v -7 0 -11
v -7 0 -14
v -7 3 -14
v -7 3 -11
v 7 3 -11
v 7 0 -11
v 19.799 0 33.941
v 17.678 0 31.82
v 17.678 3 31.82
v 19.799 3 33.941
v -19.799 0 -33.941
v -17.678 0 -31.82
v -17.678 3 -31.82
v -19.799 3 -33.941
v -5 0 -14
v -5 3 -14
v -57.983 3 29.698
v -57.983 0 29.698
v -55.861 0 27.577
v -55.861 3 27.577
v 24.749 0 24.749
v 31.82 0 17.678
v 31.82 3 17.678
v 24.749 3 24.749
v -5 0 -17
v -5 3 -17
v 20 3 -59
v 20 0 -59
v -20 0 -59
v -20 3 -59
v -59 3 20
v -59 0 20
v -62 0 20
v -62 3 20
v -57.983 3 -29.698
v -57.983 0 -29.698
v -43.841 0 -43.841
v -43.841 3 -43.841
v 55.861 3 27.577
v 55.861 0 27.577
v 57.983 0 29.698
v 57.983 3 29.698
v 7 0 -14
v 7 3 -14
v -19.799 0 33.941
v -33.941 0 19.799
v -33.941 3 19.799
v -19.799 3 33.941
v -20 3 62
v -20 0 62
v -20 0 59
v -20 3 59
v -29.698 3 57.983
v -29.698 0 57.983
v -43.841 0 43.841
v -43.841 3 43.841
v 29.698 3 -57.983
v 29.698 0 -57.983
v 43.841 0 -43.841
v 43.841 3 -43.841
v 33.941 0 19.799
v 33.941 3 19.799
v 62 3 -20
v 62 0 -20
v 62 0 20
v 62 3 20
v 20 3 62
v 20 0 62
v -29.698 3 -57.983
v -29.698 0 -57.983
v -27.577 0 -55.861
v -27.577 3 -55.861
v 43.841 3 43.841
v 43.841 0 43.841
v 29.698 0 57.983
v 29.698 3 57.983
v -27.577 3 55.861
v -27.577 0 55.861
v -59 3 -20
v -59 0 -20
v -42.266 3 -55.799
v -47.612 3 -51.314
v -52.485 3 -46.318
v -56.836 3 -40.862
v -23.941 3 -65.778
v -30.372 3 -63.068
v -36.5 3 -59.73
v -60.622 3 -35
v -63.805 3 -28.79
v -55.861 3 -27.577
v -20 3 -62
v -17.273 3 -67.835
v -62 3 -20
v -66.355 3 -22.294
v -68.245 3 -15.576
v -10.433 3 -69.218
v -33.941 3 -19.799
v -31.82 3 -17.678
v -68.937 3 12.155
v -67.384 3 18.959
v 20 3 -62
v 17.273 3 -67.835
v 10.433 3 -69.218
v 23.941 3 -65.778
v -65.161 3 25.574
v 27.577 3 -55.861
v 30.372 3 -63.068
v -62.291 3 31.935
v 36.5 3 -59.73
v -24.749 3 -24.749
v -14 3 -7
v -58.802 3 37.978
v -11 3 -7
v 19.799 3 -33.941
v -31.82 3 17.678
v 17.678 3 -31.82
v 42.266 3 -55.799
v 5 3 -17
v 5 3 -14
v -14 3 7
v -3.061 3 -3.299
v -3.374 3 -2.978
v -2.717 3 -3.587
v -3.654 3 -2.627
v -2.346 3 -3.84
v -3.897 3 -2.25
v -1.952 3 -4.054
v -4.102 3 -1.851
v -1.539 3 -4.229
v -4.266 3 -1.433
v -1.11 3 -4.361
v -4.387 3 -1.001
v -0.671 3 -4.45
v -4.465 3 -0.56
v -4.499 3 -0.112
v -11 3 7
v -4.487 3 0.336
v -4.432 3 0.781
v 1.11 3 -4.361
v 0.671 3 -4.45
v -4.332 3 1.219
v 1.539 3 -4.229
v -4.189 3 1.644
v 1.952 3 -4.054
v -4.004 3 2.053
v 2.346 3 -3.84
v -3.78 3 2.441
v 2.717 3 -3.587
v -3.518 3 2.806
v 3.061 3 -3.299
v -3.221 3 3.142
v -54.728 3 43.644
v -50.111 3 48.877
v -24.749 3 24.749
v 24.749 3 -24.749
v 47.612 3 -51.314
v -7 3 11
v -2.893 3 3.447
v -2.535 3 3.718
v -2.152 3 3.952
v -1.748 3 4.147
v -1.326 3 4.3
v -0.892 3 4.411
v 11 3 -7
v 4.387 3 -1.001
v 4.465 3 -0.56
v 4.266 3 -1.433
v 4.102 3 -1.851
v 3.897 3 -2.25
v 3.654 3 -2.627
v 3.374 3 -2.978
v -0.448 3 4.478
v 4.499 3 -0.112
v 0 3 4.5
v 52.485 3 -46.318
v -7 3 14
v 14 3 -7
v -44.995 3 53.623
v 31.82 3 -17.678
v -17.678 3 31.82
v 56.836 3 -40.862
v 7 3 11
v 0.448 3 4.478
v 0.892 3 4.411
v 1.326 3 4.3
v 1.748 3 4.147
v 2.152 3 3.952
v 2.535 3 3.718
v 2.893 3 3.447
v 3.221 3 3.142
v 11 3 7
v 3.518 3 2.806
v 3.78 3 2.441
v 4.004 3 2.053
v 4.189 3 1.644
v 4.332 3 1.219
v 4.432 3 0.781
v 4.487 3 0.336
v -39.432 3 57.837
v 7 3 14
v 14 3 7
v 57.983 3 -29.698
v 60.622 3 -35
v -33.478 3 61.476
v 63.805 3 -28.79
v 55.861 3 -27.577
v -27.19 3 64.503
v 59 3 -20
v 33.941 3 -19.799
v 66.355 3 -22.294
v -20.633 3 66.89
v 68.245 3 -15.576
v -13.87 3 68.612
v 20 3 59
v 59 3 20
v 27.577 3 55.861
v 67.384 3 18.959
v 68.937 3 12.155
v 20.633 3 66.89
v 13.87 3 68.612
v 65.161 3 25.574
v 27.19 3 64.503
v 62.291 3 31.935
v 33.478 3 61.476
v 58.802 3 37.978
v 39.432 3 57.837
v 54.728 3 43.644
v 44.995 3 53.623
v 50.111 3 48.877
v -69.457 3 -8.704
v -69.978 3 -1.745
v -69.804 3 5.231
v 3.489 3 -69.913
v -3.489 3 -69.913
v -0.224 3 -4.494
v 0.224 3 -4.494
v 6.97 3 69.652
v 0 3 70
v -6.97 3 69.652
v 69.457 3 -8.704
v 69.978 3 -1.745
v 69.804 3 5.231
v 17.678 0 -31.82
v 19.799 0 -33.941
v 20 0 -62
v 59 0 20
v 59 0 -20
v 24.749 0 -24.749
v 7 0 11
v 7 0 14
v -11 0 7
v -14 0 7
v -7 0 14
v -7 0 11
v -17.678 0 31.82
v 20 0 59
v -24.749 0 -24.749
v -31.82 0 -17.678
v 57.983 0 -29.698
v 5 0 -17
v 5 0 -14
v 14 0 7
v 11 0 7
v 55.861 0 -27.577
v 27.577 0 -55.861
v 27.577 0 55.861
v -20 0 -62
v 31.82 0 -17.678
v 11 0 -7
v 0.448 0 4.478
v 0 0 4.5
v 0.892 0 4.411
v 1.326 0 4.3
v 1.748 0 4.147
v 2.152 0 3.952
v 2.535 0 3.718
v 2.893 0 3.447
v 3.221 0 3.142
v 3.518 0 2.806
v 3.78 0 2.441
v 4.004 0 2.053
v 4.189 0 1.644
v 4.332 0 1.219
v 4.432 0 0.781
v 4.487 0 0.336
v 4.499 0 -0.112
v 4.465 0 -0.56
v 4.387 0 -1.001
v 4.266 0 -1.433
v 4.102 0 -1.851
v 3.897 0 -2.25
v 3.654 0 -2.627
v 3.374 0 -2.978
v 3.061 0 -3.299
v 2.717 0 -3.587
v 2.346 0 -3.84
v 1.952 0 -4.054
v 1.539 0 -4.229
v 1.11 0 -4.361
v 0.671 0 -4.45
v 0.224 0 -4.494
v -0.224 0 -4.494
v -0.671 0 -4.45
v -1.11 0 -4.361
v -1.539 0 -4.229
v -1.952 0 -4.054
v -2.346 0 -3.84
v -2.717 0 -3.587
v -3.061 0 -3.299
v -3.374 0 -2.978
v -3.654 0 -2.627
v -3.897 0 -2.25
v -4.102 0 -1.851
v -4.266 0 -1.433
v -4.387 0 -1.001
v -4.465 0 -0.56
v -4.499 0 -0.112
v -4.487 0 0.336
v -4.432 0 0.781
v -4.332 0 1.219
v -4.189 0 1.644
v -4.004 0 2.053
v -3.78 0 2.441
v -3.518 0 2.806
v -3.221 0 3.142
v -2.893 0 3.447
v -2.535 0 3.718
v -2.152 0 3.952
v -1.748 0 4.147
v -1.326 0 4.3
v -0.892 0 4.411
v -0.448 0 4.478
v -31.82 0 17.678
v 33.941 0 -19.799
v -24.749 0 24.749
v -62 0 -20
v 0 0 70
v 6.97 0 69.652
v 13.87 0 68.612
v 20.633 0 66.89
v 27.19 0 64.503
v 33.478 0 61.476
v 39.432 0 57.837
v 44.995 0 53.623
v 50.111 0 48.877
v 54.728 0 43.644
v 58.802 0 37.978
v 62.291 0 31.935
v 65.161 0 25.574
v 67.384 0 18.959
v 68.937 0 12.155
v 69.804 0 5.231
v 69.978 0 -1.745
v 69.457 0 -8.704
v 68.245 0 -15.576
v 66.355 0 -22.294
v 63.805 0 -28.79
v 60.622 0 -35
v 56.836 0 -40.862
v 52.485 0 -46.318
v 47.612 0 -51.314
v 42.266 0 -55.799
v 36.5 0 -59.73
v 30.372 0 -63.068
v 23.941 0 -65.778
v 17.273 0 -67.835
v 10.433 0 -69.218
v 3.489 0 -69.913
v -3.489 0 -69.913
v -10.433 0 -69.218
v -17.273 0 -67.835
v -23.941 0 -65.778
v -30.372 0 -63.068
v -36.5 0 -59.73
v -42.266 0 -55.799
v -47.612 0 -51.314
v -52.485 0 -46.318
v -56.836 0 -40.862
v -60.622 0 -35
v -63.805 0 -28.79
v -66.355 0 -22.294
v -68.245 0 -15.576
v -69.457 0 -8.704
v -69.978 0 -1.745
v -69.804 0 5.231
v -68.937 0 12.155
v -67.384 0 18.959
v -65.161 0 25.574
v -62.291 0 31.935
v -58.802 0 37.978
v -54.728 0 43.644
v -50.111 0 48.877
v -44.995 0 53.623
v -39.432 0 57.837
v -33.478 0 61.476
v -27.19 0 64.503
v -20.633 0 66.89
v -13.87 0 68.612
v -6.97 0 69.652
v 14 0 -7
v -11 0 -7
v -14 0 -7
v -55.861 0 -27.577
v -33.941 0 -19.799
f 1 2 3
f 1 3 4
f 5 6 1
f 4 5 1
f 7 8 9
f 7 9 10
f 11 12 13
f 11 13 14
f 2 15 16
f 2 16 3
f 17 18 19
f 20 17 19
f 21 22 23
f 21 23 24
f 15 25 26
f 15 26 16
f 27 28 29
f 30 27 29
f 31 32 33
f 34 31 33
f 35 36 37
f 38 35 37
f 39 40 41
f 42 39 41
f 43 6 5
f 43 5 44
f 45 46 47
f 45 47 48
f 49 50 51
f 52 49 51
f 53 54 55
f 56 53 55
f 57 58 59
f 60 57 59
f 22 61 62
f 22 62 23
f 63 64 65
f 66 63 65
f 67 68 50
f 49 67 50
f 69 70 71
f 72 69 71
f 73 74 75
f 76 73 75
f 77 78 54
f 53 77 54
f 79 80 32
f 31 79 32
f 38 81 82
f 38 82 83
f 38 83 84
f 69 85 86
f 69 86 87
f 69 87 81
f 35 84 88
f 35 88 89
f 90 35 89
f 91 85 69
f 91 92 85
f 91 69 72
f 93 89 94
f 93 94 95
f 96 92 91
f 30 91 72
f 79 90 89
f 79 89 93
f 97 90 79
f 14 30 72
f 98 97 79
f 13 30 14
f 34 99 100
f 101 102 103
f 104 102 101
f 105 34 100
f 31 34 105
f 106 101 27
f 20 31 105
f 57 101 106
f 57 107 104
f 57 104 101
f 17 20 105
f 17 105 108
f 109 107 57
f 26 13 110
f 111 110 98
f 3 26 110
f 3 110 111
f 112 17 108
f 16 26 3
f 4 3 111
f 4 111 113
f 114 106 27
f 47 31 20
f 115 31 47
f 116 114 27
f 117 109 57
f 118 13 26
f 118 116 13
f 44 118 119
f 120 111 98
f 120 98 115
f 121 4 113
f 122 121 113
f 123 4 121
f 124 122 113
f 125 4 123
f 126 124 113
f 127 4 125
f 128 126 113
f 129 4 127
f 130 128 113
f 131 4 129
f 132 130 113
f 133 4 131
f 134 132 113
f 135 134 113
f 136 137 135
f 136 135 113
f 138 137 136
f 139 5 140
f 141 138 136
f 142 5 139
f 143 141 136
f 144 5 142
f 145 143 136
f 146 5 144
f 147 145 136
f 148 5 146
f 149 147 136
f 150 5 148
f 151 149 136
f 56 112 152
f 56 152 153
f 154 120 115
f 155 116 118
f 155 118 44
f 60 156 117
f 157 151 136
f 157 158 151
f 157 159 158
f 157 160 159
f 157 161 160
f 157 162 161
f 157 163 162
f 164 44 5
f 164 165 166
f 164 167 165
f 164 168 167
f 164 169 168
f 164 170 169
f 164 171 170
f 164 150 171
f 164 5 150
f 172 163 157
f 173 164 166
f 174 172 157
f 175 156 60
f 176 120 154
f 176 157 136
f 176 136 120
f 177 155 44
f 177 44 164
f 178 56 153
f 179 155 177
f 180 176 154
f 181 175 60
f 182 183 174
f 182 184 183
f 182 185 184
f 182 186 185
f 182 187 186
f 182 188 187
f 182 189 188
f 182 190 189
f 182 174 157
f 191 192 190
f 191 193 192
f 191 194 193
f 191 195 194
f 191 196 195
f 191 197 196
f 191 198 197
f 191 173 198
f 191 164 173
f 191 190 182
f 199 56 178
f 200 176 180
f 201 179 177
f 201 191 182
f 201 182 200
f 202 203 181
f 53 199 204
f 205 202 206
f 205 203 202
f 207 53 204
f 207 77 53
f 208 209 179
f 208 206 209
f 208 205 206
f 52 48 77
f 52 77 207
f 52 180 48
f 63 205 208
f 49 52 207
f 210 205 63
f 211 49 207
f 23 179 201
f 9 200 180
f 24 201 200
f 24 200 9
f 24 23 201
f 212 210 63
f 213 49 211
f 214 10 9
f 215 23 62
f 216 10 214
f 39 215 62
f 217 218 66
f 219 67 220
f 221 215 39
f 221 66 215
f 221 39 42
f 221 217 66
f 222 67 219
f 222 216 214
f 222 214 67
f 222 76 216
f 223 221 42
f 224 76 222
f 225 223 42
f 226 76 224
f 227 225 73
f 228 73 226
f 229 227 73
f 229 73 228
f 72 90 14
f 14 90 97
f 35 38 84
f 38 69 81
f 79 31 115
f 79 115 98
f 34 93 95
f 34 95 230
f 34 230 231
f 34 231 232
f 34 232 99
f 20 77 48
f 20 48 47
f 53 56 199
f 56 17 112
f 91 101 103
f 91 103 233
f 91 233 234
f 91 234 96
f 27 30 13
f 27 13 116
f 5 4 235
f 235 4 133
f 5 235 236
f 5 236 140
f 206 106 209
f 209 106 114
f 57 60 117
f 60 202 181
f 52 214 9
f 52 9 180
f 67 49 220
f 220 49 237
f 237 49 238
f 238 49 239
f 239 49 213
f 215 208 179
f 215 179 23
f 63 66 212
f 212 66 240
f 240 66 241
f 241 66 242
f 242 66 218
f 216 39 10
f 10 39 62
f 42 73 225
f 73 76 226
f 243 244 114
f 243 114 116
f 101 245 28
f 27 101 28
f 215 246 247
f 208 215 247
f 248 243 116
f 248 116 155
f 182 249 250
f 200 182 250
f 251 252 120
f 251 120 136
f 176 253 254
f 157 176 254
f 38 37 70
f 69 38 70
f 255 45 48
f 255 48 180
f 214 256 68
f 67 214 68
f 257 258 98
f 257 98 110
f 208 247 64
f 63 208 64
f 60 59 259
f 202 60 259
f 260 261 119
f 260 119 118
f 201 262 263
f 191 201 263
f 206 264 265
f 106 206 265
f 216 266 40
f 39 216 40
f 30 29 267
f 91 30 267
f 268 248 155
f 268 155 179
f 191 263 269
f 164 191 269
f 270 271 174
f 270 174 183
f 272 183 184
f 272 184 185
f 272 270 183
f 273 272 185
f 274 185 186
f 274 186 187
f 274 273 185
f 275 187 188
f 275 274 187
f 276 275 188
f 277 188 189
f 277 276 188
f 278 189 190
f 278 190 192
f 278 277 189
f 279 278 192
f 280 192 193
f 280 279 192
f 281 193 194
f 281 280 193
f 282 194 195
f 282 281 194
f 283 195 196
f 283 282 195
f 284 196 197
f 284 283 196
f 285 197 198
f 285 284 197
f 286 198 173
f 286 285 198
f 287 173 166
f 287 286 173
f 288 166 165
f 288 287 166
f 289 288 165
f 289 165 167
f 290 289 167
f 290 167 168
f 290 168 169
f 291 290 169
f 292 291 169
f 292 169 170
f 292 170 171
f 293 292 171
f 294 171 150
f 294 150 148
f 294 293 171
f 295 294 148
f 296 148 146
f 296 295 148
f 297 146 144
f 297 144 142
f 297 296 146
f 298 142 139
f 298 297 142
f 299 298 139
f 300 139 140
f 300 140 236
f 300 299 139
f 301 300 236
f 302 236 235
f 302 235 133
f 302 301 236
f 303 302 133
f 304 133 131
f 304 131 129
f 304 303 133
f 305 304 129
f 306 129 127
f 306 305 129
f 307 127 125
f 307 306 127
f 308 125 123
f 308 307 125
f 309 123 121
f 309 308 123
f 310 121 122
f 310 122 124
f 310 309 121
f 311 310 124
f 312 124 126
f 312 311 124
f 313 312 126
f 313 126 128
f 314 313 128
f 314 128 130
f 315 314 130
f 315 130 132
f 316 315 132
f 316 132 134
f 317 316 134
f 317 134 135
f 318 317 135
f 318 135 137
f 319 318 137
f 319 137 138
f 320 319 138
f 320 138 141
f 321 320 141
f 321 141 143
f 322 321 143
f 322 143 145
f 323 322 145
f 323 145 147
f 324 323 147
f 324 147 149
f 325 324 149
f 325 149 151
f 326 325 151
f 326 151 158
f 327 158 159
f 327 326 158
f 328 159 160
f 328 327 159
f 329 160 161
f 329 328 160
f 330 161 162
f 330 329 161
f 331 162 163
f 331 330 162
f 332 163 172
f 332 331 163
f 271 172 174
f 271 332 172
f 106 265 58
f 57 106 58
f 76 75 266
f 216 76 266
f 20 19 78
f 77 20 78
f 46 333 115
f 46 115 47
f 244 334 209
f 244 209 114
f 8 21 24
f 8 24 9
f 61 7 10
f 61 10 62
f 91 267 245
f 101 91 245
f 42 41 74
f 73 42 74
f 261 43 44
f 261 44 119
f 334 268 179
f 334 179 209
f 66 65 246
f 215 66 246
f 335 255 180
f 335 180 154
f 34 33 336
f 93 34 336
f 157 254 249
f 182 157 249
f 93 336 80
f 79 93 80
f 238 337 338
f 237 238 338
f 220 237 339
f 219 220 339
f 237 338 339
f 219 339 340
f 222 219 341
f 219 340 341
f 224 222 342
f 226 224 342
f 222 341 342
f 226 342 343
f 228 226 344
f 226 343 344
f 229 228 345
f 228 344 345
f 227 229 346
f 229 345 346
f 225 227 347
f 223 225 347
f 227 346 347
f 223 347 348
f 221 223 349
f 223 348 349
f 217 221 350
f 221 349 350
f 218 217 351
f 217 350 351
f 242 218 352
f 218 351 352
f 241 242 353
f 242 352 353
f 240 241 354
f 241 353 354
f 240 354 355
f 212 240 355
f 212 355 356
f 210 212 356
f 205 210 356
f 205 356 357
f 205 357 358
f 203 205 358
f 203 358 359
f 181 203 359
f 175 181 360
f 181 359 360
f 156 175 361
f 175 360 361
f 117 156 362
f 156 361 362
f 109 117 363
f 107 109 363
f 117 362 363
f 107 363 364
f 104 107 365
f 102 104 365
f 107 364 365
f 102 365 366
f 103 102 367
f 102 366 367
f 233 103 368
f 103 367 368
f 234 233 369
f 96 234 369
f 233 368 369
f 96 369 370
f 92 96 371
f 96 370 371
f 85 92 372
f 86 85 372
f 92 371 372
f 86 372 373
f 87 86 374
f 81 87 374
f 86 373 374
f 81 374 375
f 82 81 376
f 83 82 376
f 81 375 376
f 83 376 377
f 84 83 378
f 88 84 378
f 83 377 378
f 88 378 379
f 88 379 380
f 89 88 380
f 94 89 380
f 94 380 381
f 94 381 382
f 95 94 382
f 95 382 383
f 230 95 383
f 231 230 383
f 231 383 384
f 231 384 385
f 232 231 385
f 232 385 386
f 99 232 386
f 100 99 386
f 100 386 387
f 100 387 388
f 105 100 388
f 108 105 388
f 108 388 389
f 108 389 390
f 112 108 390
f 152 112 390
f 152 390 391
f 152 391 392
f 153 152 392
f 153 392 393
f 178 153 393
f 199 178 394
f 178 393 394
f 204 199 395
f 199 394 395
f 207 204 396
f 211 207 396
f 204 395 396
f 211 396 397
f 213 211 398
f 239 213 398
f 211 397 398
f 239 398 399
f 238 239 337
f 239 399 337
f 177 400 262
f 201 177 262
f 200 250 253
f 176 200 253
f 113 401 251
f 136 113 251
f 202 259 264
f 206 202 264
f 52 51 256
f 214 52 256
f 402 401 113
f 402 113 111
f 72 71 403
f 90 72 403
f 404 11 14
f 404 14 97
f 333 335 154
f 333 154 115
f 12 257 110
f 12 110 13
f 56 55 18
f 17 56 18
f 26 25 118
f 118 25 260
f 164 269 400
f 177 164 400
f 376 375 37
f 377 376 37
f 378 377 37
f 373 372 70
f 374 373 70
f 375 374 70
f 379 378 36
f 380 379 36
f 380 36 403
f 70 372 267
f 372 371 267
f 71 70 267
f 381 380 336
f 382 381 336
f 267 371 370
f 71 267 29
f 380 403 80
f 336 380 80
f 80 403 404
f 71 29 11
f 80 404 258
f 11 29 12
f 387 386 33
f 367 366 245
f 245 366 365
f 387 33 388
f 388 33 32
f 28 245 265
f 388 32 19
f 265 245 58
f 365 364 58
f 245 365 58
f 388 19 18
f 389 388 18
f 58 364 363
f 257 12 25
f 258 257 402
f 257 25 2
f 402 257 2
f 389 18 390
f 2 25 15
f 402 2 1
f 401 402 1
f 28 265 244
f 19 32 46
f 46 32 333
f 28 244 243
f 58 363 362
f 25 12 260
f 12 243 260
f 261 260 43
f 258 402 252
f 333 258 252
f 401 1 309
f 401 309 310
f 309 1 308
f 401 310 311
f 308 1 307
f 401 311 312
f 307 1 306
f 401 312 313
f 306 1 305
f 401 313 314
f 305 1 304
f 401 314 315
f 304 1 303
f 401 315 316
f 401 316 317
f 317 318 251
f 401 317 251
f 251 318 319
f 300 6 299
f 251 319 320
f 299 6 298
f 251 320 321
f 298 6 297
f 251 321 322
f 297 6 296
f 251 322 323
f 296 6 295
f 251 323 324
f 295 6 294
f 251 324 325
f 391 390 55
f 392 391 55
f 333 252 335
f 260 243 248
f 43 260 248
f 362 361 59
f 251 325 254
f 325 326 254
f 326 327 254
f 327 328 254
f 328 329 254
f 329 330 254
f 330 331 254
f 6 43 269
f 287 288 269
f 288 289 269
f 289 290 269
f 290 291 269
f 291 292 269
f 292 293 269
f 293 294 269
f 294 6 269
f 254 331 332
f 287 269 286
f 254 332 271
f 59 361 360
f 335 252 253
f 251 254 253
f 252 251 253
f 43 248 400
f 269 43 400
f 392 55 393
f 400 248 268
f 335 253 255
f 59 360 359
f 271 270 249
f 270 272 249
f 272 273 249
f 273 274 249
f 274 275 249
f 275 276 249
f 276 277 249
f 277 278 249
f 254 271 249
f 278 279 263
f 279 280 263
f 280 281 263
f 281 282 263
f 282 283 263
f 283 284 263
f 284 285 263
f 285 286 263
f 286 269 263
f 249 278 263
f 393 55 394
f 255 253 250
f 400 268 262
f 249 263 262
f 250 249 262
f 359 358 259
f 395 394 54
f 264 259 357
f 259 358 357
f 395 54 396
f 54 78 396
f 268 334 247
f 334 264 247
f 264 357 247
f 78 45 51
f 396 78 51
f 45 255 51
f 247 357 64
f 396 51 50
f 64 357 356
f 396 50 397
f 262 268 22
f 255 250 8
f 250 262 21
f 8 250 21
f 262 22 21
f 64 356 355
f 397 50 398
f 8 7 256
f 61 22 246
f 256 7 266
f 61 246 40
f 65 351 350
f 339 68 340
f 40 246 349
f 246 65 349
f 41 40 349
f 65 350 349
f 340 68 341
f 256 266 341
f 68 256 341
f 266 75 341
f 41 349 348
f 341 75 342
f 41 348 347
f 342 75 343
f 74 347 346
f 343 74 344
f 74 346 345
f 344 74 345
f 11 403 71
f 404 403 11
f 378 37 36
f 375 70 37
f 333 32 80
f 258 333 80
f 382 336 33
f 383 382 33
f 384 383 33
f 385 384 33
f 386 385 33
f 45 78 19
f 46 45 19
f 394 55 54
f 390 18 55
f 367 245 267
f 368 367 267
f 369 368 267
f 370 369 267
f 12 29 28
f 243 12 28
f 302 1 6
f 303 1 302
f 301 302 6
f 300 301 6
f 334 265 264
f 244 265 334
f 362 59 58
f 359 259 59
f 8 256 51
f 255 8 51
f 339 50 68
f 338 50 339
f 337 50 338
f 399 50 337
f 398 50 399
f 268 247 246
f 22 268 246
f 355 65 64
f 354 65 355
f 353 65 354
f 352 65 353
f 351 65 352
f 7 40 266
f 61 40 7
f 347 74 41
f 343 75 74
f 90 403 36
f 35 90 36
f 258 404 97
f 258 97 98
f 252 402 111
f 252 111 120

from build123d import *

# Parameters (mm, degrees)
CROQUIS1_R              = 70
CROQUIS1_R_2            = 4.5
SALIENTE_EXTRUIR1_DEPTH = 3


with BuildPart() as part:
    # Croquis1 → Saliente-Extruir1 (new body)
    with BuildSketch(Plane(origin=(0, 0, 0), x_dir=(1, 0, 0), z_dir=(0, 1, 0))):
        with Locations(Location((0, 0, 0), (0, 0, 270))):
            Circle(CROQUIS1_R)
        with Locations(Location((0, 0, 0), (0, 0, 270))):
            Circle(CROQUIS1_R_2, mode=Mode.SUBTRACT)
        Polygon((0, 11), (7, 11), (7, 14), (5, 14), (5, 17), (0, 17), (-5, 17), (-5, 14), (-7, 14), (-7, 11), align=None, mode=Mode.SUBTRACT)
        Polygon((24.748737342, 24.748737342), (31.819805153, 17.67766953), (33.941125497, 19.798989873), (19.798989873, 33.941125497), (17.67766953, 31.819805153), align=None, mode=Mode.SUBTRACT)
        Polygon((11, 0), (11, 7), (14, 7), (14, -7), (11, -7), align=None, mode=Mode.SUBTRACT)
        Polygon((-24.748737342, 24.748737342), (-17.67766953, 31.819805153), (-19.798989873, 33.941125497), (-33.941125497, 19.798989873), (-31.819805153, 17.67766953), align=None, mode=Mode.SUBTRACT)
        Polygon((-14, -7), (-11, -7), (-11, 0), (-11, 7), (-14, 7), align=None, mode=Mode.SUBTRACT)
        Polygon((7, -11), (7, -14), (-7, -14), (-7, -11), (0, -11), align=None, mode=Mode.SUBTRACT)
        Polygon((24.748737342, -24.748737342), (17.67766953, -31.819805153), (19.798989873, -33.941125497), (33.941125497, -19.798989873), (31.819805153, -17.67766953), align=None, mode=Mode.SUBTRACT)
        Polygon((-24.748737342, -24.748737342), (-31.819805153, -17.67766953), (-33.941125497, -19.798989873), (-19.798989873, -33.941125497), (-17.67766953, -31.819805153), align=None, mode=Mode.SUBTRACT)
        Polygon((0, 62), (20, 62), (20, 59), (-20, 59), (-20, 62), align=None, mode=Mode.SUBTRACT)
        Polygon((55.861435714, 27.577164466), (27.577164466, 55.861435714), (29.69848481, 57.982756057), (43.840620434, 43.840620434), (57.982756057, 29.69848481), align=None, mode=Mode.SUBTRACT)
        Polygon((59, -20), (59, 20), (62, 20), (62, 0), (62, -20), align=None, mode=Mode.SUBTRACT)
        Polygon((27.577164466, -55.861435714), (55.861435714, -27.577164466), (57.982756057, -29.69848481), (43.840620434, -43.840620434), (29.69848481, -57.982756057), align=None, mode=Mode.SUBTRACT)
        Polygon((-20, -59), (20, -59), (20, -62), (0, -62), (-20, -62), align=None, mode=Mode.SUBTRACT)
        Polygon((-55.861435714, -27.577164466), (-27.577164466, -55.861435714), (-29.69848481, -57.982756057), (-43.840620434, -43.840620434), (-57.982756057, -29.69848481), align=None, mode=Mode.SUBTRACT)
        Polygon((-59, 20), (-59, -20), (-62, -20), (-62, 0), (-62, 20), align=None, mode=Mode.SUBTRACT)
        Polygon((-27.577164466, 55.861435714), (-55.861435714, 27.577164466), (-57.982756057, 29.69848481), (-43.840620434, 43.840620434), (-29.69848481, 57.982756057), align=None, mode=Mode.SUBTRACT)
    extrude(amount=SALIENTE_EXTRUIR1_DEPTH)


solid = part.part
